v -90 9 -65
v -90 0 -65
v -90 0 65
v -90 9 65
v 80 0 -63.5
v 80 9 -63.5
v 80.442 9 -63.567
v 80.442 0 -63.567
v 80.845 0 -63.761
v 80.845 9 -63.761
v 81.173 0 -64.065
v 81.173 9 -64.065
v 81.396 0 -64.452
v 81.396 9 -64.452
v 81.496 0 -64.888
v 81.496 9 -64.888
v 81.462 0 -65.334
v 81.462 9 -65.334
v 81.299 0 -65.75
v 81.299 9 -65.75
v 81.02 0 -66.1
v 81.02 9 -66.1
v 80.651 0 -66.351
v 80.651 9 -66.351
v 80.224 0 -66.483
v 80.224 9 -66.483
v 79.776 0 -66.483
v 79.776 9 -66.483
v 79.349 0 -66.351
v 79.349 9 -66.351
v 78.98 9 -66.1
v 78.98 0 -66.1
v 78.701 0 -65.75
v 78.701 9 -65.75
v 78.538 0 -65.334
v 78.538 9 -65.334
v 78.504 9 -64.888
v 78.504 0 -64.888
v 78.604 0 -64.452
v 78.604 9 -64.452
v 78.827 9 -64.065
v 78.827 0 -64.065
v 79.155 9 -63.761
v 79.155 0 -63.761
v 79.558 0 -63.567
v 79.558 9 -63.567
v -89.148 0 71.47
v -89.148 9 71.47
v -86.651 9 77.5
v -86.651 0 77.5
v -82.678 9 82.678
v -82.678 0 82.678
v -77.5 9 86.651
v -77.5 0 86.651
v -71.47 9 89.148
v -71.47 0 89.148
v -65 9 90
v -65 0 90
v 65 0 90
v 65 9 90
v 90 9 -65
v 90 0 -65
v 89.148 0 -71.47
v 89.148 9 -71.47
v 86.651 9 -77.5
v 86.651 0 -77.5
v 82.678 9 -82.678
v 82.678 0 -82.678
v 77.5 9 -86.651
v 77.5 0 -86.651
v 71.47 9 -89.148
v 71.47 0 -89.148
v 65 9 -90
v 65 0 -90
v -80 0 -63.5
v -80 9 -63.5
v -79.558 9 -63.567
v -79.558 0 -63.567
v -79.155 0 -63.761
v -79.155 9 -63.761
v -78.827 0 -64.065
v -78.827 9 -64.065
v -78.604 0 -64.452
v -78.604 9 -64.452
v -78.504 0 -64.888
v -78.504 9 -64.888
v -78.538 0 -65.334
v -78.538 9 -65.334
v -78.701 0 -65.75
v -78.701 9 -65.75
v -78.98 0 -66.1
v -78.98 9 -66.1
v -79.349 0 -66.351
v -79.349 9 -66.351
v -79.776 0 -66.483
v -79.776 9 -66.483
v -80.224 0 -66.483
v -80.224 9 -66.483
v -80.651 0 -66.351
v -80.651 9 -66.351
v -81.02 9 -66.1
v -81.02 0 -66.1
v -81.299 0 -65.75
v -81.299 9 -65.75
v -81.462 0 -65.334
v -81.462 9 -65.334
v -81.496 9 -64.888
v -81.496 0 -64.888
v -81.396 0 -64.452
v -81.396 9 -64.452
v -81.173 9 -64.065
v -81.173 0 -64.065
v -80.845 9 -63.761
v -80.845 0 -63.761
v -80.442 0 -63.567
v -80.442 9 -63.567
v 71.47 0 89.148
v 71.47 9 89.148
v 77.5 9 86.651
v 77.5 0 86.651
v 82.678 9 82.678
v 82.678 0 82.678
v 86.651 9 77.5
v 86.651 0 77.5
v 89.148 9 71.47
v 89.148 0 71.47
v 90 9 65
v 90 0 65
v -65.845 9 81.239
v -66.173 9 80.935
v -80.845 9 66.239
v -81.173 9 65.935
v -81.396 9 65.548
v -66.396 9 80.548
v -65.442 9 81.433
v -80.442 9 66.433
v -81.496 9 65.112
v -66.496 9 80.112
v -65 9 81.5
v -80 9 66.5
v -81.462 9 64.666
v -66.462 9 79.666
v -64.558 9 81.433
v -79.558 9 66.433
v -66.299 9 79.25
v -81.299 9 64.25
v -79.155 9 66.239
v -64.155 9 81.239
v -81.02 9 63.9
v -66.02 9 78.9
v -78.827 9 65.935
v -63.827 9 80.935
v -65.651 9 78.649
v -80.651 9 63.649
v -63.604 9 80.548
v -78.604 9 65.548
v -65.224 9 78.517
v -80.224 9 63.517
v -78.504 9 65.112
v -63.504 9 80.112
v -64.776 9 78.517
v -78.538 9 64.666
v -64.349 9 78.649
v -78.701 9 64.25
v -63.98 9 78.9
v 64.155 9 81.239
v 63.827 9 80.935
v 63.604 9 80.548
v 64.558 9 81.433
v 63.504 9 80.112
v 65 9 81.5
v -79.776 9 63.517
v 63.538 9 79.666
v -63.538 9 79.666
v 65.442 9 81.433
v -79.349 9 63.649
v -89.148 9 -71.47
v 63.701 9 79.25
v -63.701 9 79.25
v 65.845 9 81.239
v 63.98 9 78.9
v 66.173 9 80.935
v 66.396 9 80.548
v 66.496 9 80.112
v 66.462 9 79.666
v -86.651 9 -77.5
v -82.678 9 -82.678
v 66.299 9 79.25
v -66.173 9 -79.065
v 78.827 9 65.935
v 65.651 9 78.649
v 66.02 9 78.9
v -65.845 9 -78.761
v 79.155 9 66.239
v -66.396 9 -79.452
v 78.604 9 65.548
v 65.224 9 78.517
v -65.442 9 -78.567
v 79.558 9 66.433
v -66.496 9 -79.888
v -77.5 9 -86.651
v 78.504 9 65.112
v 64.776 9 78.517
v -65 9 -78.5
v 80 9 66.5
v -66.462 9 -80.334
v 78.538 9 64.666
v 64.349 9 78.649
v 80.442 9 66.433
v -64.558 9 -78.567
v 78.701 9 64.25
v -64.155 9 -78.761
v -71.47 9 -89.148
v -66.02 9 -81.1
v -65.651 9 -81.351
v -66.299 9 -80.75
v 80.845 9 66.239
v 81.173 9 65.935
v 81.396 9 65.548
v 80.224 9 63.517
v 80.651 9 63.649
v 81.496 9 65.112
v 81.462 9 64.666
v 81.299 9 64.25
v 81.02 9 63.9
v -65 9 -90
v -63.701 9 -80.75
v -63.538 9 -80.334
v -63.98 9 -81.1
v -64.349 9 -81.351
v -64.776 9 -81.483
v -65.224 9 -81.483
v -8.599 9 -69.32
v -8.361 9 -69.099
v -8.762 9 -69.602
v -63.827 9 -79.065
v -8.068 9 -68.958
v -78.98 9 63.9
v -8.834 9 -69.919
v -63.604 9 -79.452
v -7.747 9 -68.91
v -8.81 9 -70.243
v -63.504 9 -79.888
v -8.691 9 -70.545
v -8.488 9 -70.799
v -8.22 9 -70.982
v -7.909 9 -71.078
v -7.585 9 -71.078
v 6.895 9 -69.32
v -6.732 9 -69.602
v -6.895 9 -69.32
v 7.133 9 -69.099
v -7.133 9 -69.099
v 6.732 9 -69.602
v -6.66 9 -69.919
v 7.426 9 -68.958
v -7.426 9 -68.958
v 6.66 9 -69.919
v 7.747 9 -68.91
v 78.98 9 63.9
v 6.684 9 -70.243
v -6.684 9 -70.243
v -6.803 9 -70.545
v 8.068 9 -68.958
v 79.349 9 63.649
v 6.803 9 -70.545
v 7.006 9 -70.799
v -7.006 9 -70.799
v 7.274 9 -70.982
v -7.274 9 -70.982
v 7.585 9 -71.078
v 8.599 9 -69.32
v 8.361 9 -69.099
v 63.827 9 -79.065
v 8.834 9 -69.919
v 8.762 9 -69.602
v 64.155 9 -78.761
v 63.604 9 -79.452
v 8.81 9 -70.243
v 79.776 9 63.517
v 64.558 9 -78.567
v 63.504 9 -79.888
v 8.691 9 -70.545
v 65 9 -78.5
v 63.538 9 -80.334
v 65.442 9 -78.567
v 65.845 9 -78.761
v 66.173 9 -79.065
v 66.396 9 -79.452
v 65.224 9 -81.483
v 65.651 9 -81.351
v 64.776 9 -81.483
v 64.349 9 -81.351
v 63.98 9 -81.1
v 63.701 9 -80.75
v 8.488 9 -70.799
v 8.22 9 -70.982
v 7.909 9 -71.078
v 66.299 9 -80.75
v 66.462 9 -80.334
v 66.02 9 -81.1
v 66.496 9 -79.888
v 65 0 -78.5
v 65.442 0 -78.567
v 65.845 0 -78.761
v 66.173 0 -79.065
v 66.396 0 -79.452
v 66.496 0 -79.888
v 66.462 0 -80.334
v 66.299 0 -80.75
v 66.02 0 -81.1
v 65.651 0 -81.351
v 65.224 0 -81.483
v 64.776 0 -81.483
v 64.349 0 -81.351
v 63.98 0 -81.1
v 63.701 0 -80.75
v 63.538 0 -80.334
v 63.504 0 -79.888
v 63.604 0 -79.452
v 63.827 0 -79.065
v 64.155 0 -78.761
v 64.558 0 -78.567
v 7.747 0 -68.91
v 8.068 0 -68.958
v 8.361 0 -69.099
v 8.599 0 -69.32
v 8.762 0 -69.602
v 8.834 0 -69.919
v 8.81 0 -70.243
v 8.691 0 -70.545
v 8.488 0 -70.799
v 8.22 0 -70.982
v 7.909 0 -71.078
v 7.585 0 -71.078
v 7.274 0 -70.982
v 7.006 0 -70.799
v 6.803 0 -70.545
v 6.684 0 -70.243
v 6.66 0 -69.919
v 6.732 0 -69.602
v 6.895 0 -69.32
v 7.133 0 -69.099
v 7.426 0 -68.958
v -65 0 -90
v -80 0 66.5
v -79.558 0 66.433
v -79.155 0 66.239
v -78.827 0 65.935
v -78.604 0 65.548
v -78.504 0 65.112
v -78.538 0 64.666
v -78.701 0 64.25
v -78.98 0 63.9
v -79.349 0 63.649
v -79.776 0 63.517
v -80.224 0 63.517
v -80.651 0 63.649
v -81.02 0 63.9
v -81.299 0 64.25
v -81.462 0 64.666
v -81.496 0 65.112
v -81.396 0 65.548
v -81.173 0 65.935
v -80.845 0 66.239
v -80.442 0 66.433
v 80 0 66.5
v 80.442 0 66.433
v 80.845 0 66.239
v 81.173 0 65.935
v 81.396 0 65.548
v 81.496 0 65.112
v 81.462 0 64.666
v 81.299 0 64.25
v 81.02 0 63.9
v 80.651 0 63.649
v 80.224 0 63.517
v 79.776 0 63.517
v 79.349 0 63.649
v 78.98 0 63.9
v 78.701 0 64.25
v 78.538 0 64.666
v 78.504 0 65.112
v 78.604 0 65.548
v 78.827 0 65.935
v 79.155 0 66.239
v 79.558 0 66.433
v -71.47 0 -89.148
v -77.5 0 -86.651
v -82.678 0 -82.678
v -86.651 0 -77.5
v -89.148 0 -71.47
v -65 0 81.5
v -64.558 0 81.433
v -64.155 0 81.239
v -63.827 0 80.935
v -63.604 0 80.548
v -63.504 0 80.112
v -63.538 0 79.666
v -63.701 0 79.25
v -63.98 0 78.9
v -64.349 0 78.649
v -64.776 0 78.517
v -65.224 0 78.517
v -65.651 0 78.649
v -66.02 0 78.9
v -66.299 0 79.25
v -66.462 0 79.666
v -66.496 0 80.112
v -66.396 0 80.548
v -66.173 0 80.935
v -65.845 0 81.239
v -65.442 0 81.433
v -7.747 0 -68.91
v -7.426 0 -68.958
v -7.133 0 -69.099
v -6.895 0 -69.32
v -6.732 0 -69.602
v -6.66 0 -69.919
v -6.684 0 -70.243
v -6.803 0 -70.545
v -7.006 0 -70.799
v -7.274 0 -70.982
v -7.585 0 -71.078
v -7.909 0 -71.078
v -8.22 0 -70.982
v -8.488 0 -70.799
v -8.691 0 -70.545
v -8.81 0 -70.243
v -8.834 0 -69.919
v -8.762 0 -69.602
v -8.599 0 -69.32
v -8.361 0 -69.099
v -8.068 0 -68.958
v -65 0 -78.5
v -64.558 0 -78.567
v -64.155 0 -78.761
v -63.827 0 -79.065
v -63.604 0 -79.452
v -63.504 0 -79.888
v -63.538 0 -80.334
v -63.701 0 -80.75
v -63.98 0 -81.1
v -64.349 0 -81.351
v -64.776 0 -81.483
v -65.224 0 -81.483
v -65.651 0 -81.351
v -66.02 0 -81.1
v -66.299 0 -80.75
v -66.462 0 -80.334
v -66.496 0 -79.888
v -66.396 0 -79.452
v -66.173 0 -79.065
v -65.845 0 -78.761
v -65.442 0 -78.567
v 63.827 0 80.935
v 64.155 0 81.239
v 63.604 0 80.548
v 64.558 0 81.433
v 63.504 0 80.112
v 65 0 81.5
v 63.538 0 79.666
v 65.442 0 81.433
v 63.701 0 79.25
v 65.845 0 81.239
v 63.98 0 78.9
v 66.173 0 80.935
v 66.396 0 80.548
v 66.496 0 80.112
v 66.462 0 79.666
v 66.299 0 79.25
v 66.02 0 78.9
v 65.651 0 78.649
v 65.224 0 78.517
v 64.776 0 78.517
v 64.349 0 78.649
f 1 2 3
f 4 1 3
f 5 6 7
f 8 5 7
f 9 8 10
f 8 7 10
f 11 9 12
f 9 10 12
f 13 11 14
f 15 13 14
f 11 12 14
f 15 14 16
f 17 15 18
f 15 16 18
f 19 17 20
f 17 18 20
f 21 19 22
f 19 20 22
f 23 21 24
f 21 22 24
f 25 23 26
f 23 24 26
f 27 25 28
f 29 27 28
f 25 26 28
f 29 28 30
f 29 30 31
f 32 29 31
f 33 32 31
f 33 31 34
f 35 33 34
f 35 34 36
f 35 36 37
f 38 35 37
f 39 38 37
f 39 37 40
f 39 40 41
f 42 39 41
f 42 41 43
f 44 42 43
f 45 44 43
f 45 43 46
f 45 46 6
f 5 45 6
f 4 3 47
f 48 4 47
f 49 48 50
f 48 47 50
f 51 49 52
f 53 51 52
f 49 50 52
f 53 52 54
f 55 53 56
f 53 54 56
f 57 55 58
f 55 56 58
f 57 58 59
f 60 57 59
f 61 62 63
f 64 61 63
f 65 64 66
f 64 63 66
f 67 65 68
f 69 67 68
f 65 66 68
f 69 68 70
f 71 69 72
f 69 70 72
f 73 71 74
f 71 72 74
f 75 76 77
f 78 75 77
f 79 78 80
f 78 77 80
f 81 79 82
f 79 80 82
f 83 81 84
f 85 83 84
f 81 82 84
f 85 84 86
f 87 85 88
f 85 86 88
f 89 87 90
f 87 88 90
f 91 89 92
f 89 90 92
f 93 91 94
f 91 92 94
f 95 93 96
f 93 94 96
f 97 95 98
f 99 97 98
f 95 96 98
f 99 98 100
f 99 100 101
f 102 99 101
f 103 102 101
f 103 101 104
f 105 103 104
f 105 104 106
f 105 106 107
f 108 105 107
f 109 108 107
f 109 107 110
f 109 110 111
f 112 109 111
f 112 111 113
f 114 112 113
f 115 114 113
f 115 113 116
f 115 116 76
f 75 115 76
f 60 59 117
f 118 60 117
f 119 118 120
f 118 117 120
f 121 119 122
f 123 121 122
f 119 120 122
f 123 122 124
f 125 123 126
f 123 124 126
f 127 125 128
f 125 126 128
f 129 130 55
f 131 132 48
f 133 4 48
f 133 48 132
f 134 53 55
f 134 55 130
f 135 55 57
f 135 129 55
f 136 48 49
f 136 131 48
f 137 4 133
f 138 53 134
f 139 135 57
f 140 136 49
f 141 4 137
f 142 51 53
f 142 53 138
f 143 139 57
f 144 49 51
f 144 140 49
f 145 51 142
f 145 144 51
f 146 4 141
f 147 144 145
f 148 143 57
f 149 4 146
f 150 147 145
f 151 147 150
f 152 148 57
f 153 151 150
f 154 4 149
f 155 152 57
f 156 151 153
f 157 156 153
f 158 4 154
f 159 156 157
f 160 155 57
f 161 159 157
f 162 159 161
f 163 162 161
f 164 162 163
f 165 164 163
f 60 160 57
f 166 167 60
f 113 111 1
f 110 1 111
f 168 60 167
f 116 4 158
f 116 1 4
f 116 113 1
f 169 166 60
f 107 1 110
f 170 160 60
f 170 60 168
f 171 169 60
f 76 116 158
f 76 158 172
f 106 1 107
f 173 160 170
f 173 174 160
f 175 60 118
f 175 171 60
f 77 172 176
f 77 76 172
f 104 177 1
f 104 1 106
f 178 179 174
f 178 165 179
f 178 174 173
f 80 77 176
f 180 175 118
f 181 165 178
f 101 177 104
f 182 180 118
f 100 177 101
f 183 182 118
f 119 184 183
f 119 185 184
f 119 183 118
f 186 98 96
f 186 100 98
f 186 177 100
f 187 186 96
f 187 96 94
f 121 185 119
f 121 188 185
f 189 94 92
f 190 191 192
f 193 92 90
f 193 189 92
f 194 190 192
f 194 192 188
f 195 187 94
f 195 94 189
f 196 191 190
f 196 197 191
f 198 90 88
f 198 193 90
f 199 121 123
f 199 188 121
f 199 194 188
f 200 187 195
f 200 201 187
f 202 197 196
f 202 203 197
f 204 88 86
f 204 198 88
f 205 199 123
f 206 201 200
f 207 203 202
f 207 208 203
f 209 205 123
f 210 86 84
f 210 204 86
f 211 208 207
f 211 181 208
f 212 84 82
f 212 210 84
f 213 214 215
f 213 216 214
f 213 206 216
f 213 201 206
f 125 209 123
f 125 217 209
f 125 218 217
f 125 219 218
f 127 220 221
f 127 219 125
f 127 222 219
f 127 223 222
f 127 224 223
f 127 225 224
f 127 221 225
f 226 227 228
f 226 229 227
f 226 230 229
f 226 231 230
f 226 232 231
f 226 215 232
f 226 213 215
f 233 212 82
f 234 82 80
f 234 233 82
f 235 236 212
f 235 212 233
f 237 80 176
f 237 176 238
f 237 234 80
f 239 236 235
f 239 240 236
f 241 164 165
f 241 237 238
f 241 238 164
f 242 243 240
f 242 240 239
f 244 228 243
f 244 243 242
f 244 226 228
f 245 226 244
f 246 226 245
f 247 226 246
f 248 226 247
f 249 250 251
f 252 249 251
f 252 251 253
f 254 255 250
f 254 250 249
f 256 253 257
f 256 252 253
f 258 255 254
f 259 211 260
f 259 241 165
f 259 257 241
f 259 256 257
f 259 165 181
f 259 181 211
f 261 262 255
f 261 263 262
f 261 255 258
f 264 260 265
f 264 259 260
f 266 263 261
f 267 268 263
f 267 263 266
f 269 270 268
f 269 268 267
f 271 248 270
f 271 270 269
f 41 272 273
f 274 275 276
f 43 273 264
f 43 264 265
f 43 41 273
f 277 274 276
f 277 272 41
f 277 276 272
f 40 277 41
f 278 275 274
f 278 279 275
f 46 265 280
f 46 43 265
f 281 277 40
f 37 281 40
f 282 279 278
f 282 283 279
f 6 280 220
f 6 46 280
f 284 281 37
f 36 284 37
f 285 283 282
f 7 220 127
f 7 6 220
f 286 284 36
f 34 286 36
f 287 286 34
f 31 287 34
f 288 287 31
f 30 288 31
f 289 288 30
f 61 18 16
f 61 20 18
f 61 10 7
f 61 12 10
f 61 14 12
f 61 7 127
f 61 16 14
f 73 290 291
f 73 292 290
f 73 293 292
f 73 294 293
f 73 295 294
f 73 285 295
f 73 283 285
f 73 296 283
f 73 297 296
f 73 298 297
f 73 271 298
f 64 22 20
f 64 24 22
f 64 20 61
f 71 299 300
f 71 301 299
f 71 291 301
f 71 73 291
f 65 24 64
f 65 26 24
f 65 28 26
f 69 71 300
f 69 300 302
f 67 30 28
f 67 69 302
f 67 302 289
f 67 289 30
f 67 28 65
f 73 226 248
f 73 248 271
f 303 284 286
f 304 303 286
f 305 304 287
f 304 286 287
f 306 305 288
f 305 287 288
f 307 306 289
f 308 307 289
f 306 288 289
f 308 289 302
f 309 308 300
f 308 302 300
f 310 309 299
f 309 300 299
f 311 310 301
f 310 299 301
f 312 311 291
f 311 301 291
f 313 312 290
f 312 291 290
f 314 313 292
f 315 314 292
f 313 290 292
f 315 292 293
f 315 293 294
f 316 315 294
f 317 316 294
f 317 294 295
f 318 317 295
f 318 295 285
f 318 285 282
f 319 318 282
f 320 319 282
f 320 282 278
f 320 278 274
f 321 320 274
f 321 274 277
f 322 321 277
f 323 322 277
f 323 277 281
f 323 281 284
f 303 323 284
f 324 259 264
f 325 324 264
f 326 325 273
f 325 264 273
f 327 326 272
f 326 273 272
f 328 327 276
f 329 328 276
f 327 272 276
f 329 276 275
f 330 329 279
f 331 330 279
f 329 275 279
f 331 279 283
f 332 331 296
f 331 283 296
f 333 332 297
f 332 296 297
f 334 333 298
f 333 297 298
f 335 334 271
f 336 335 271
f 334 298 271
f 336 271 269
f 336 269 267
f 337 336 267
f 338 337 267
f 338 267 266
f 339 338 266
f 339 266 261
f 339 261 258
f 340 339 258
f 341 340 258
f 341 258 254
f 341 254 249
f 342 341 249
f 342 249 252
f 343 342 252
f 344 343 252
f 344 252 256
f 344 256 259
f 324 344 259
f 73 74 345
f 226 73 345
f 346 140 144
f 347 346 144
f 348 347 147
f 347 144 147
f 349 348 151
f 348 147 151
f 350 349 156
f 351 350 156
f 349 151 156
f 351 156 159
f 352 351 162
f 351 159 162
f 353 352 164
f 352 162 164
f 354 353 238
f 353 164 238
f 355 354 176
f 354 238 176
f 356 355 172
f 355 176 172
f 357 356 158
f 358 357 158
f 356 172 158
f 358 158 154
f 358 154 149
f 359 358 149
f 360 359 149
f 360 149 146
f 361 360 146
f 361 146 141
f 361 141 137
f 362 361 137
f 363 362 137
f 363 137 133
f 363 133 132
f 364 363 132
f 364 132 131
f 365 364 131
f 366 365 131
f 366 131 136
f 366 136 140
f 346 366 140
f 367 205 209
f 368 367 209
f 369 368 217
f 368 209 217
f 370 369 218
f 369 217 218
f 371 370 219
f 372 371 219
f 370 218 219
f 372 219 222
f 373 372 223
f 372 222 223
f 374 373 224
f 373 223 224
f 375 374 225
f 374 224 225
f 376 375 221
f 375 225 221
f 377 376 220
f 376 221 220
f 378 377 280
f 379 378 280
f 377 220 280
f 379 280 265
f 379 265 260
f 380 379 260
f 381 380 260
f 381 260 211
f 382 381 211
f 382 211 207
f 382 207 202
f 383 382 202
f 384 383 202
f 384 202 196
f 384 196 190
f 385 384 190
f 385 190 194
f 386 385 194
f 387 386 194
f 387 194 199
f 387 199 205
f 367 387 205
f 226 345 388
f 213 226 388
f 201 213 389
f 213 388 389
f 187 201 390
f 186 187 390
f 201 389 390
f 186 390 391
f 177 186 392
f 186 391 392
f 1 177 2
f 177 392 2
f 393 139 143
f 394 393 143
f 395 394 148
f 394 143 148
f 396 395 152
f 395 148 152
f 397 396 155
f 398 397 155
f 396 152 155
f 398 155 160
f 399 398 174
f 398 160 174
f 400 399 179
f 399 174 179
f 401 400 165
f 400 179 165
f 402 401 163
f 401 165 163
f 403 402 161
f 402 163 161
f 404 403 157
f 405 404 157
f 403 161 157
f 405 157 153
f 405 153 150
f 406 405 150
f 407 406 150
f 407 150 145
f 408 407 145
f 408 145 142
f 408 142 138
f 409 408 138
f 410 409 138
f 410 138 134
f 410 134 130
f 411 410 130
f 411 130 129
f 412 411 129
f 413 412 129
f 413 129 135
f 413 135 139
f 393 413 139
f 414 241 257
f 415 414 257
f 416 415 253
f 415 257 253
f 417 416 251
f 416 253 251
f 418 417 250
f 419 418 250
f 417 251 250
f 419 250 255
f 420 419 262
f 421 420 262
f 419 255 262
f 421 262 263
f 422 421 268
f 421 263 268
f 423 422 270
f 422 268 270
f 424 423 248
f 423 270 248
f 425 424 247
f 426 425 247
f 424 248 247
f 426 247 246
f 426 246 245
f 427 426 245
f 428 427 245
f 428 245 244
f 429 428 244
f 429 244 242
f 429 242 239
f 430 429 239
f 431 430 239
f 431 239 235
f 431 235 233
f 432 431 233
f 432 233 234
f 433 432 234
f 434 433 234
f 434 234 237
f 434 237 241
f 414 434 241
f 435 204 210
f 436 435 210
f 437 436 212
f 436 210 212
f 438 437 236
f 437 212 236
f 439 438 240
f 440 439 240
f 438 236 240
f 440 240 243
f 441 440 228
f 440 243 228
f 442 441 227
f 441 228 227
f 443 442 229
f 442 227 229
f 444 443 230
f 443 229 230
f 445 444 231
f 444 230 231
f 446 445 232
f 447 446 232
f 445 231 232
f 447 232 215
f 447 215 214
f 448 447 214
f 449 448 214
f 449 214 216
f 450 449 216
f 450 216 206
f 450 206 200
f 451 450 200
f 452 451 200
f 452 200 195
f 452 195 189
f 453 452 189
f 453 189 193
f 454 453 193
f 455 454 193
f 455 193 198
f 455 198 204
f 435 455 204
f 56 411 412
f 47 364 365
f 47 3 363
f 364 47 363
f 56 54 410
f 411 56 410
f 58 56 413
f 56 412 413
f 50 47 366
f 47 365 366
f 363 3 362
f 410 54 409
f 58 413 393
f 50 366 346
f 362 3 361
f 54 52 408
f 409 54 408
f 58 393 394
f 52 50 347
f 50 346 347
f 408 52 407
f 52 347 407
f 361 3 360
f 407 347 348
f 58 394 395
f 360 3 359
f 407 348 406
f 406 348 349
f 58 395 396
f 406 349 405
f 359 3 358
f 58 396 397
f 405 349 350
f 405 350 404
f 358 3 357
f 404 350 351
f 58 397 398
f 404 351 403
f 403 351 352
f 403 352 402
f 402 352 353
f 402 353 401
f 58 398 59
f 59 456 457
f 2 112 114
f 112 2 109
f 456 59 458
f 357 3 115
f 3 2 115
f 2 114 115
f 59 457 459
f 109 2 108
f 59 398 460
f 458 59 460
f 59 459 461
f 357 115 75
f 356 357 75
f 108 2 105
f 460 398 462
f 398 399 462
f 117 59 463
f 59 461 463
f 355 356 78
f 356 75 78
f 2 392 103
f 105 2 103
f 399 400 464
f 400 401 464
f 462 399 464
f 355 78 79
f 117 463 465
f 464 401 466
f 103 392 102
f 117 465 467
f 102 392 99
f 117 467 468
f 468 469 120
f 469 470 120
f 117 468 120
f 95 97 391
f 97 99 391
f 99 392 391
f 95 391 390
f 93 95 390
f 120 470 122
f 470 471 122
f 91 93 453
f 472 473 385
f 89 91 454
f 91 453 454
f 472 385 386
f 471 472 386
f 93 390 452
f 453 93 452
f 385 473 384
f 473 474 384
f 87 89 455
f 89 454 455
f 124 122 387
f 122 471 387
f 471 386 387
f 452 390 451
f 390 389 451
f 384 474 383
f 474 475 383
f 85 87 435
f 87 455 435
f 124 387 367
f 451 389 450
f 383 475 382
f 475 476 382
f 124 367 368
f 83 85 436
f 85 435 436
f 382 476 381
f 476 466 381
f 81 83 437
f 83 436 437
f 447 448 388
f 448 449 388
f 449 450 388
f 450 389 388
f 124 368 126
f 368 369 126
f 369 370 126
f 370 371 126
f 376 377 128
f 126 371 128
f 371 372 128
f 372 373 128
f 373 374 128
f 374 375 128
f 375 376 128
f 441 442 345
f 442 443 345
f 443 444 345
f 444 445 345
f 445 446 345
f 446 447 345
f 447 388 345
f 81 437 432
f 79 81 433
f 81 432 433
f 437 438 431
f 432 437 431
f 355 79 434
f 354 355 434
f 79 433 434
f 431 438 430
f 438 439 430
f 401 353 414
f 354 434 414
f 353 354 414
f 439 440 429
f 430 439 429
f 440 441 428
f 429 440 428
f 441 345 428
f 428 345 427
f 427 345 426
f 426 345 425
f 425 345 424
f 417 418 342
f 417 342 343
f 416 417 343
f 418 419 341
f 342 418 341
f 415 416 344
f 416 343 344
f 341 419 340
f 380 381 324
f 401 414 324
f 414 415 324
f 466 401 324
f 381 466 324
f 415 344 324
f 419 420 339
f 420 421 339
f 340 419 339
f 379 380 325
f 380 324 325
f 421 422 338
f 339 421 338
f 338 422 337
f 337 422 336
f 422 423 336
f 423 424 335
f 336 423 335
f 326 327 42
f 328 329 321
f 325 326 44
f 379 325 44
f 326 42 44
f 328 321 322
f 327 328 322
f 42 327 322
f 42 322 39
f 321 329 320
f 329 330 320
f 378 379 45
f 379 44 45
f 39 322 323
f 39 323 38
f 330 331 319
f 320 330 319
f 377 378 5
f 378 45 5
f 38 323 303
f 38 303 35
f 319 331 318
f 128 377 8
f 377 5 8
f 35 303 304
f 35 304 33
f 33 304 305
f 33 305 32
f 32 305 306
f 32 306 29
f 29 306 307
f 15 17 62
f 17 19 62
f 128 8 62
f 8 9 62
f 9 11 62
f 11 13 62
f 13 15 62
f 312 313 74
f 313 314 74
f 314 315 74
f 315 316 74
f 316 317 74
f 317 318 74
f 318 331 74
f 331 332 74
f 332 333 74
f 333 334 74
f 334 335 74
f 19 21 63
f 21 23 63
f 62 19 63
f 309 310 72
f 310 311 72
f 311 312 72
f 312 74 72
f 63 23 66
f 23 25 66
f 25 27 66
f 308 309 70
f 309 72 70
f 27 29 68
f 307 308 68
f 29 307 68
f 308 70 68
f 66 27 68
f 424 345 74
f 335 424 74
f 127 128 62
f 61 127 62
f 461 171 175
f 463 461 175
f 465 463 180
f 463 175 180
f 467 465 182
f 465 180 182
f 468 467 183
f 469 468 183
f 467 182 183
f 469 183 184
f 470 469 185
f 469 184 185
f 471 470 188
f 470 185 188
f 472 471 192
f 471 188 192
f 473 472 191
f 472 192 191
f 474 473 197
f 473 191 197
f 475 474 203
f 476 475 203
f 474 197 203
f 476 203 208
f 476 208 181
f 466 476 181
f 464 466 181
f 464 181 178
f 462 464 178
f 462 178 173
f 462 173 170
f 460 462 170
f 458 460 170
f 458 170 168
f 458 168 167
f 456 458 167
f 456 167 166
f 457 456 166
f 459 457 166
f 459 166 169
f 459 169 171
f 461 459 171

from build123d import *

# Parameters (mm, degrees)
BOSS_EXTRUDE1_DEPTH = 9
SKETCH2_R           = 1.09
CUT_EXTRUDE1_DEPTH  = 128.597021909
SKETCH3_R           = 1.5
CUT_EXTRUDE2_DEPTH  = 128.597021909


with BuildPart() as part:
    # Sketch1 → Boss-Extrude1 (new body)
    with BuildSketch(Plane(origin=(0, 0, 0), x_dir=(1, 0, 0), z_dir=(0, 1, 0))):
        with BuildLine():
            Line((-65, -90), (65, -90))
            ThreePointArc((65, -90), (82.67766953, -82.67766953), (90, -65))
            Line((90, -65), (90, 65))
            ThreePointArc((90, 65), (82.67766953, 82.67766953), (65, 90))
            Line((65, 90), (-65, 90))
            ThreePointArc((-65, 90), (-82.67766953, 82.67766953), (-90, 65))
            Line((-90, 65), (-90, -65))
            ThreePointArc((-90, -65), (-82.67766953, -82.67766953), (-65, -90))
        make_face()
    extrude(amount=BOSS_EXTRUDE1_DEPTH)

    # Sketch2 → Cut-Extrude1 (cut, through all)
    with BuildSketch(Plane(origin=(0, 9, 0), x_dir=(1, 0, 0), z_dir=(0, 1, 0))):
        with Locations(Location((-7.747, 70, 0), (0, 0, 270))):
            Circle(SKETCH2_R)
        with Locations(Location((7.747, 70, 0), (0, 0, 270))):
            Circle(SKETCH2_R)
    extrude(amount=-CUT_EXTRUDE1_DEPTH, mode=Mode.SUBTRACT)

    # Sketch3 → Cut-Extrude2 (cut, through all)
    with BuildSketch(Plane(origin=(0, 9, 0), x_dir=(1, 0, 0), z_dir=(0, 1, 0))):
        with Locations(Location((-65, 80, 0), (0, 0, 270))):
            Circle(SKETCH3_R)
        with Locations(Location((-80, 65, 0), (0, 0, 270))):
            Circle(SKETCH3_R)
        with Locations(Location((80, 65, 0), (0, 0, 270))):
            Circle(SKETCH3_R)
        with Locations(Location((80, -65, 0), (0, 0, 270))):
            Circle(SKETCH3_R)
        with Locations(Location((65, 80, 0), (0, 0, 270))):
            Circle(SKETCH3_R)
        with Locations(Location((65, -80, 0), (0, 0, 270))):
            Circle(SKETCH3_R)
        with Locations(Location((-65, -80, 0), (0, 0, 270))):
            Circle(SKETCH3_R)
        with Locations(Location((-80, -65, 0), (0, 0, 270))):
            Circle(SKETCH3_R)
    extrude(amount=-CUT_EXTRUDE2_DEPTH, mode=Mode.SUBTRACT)


solid = part.part
